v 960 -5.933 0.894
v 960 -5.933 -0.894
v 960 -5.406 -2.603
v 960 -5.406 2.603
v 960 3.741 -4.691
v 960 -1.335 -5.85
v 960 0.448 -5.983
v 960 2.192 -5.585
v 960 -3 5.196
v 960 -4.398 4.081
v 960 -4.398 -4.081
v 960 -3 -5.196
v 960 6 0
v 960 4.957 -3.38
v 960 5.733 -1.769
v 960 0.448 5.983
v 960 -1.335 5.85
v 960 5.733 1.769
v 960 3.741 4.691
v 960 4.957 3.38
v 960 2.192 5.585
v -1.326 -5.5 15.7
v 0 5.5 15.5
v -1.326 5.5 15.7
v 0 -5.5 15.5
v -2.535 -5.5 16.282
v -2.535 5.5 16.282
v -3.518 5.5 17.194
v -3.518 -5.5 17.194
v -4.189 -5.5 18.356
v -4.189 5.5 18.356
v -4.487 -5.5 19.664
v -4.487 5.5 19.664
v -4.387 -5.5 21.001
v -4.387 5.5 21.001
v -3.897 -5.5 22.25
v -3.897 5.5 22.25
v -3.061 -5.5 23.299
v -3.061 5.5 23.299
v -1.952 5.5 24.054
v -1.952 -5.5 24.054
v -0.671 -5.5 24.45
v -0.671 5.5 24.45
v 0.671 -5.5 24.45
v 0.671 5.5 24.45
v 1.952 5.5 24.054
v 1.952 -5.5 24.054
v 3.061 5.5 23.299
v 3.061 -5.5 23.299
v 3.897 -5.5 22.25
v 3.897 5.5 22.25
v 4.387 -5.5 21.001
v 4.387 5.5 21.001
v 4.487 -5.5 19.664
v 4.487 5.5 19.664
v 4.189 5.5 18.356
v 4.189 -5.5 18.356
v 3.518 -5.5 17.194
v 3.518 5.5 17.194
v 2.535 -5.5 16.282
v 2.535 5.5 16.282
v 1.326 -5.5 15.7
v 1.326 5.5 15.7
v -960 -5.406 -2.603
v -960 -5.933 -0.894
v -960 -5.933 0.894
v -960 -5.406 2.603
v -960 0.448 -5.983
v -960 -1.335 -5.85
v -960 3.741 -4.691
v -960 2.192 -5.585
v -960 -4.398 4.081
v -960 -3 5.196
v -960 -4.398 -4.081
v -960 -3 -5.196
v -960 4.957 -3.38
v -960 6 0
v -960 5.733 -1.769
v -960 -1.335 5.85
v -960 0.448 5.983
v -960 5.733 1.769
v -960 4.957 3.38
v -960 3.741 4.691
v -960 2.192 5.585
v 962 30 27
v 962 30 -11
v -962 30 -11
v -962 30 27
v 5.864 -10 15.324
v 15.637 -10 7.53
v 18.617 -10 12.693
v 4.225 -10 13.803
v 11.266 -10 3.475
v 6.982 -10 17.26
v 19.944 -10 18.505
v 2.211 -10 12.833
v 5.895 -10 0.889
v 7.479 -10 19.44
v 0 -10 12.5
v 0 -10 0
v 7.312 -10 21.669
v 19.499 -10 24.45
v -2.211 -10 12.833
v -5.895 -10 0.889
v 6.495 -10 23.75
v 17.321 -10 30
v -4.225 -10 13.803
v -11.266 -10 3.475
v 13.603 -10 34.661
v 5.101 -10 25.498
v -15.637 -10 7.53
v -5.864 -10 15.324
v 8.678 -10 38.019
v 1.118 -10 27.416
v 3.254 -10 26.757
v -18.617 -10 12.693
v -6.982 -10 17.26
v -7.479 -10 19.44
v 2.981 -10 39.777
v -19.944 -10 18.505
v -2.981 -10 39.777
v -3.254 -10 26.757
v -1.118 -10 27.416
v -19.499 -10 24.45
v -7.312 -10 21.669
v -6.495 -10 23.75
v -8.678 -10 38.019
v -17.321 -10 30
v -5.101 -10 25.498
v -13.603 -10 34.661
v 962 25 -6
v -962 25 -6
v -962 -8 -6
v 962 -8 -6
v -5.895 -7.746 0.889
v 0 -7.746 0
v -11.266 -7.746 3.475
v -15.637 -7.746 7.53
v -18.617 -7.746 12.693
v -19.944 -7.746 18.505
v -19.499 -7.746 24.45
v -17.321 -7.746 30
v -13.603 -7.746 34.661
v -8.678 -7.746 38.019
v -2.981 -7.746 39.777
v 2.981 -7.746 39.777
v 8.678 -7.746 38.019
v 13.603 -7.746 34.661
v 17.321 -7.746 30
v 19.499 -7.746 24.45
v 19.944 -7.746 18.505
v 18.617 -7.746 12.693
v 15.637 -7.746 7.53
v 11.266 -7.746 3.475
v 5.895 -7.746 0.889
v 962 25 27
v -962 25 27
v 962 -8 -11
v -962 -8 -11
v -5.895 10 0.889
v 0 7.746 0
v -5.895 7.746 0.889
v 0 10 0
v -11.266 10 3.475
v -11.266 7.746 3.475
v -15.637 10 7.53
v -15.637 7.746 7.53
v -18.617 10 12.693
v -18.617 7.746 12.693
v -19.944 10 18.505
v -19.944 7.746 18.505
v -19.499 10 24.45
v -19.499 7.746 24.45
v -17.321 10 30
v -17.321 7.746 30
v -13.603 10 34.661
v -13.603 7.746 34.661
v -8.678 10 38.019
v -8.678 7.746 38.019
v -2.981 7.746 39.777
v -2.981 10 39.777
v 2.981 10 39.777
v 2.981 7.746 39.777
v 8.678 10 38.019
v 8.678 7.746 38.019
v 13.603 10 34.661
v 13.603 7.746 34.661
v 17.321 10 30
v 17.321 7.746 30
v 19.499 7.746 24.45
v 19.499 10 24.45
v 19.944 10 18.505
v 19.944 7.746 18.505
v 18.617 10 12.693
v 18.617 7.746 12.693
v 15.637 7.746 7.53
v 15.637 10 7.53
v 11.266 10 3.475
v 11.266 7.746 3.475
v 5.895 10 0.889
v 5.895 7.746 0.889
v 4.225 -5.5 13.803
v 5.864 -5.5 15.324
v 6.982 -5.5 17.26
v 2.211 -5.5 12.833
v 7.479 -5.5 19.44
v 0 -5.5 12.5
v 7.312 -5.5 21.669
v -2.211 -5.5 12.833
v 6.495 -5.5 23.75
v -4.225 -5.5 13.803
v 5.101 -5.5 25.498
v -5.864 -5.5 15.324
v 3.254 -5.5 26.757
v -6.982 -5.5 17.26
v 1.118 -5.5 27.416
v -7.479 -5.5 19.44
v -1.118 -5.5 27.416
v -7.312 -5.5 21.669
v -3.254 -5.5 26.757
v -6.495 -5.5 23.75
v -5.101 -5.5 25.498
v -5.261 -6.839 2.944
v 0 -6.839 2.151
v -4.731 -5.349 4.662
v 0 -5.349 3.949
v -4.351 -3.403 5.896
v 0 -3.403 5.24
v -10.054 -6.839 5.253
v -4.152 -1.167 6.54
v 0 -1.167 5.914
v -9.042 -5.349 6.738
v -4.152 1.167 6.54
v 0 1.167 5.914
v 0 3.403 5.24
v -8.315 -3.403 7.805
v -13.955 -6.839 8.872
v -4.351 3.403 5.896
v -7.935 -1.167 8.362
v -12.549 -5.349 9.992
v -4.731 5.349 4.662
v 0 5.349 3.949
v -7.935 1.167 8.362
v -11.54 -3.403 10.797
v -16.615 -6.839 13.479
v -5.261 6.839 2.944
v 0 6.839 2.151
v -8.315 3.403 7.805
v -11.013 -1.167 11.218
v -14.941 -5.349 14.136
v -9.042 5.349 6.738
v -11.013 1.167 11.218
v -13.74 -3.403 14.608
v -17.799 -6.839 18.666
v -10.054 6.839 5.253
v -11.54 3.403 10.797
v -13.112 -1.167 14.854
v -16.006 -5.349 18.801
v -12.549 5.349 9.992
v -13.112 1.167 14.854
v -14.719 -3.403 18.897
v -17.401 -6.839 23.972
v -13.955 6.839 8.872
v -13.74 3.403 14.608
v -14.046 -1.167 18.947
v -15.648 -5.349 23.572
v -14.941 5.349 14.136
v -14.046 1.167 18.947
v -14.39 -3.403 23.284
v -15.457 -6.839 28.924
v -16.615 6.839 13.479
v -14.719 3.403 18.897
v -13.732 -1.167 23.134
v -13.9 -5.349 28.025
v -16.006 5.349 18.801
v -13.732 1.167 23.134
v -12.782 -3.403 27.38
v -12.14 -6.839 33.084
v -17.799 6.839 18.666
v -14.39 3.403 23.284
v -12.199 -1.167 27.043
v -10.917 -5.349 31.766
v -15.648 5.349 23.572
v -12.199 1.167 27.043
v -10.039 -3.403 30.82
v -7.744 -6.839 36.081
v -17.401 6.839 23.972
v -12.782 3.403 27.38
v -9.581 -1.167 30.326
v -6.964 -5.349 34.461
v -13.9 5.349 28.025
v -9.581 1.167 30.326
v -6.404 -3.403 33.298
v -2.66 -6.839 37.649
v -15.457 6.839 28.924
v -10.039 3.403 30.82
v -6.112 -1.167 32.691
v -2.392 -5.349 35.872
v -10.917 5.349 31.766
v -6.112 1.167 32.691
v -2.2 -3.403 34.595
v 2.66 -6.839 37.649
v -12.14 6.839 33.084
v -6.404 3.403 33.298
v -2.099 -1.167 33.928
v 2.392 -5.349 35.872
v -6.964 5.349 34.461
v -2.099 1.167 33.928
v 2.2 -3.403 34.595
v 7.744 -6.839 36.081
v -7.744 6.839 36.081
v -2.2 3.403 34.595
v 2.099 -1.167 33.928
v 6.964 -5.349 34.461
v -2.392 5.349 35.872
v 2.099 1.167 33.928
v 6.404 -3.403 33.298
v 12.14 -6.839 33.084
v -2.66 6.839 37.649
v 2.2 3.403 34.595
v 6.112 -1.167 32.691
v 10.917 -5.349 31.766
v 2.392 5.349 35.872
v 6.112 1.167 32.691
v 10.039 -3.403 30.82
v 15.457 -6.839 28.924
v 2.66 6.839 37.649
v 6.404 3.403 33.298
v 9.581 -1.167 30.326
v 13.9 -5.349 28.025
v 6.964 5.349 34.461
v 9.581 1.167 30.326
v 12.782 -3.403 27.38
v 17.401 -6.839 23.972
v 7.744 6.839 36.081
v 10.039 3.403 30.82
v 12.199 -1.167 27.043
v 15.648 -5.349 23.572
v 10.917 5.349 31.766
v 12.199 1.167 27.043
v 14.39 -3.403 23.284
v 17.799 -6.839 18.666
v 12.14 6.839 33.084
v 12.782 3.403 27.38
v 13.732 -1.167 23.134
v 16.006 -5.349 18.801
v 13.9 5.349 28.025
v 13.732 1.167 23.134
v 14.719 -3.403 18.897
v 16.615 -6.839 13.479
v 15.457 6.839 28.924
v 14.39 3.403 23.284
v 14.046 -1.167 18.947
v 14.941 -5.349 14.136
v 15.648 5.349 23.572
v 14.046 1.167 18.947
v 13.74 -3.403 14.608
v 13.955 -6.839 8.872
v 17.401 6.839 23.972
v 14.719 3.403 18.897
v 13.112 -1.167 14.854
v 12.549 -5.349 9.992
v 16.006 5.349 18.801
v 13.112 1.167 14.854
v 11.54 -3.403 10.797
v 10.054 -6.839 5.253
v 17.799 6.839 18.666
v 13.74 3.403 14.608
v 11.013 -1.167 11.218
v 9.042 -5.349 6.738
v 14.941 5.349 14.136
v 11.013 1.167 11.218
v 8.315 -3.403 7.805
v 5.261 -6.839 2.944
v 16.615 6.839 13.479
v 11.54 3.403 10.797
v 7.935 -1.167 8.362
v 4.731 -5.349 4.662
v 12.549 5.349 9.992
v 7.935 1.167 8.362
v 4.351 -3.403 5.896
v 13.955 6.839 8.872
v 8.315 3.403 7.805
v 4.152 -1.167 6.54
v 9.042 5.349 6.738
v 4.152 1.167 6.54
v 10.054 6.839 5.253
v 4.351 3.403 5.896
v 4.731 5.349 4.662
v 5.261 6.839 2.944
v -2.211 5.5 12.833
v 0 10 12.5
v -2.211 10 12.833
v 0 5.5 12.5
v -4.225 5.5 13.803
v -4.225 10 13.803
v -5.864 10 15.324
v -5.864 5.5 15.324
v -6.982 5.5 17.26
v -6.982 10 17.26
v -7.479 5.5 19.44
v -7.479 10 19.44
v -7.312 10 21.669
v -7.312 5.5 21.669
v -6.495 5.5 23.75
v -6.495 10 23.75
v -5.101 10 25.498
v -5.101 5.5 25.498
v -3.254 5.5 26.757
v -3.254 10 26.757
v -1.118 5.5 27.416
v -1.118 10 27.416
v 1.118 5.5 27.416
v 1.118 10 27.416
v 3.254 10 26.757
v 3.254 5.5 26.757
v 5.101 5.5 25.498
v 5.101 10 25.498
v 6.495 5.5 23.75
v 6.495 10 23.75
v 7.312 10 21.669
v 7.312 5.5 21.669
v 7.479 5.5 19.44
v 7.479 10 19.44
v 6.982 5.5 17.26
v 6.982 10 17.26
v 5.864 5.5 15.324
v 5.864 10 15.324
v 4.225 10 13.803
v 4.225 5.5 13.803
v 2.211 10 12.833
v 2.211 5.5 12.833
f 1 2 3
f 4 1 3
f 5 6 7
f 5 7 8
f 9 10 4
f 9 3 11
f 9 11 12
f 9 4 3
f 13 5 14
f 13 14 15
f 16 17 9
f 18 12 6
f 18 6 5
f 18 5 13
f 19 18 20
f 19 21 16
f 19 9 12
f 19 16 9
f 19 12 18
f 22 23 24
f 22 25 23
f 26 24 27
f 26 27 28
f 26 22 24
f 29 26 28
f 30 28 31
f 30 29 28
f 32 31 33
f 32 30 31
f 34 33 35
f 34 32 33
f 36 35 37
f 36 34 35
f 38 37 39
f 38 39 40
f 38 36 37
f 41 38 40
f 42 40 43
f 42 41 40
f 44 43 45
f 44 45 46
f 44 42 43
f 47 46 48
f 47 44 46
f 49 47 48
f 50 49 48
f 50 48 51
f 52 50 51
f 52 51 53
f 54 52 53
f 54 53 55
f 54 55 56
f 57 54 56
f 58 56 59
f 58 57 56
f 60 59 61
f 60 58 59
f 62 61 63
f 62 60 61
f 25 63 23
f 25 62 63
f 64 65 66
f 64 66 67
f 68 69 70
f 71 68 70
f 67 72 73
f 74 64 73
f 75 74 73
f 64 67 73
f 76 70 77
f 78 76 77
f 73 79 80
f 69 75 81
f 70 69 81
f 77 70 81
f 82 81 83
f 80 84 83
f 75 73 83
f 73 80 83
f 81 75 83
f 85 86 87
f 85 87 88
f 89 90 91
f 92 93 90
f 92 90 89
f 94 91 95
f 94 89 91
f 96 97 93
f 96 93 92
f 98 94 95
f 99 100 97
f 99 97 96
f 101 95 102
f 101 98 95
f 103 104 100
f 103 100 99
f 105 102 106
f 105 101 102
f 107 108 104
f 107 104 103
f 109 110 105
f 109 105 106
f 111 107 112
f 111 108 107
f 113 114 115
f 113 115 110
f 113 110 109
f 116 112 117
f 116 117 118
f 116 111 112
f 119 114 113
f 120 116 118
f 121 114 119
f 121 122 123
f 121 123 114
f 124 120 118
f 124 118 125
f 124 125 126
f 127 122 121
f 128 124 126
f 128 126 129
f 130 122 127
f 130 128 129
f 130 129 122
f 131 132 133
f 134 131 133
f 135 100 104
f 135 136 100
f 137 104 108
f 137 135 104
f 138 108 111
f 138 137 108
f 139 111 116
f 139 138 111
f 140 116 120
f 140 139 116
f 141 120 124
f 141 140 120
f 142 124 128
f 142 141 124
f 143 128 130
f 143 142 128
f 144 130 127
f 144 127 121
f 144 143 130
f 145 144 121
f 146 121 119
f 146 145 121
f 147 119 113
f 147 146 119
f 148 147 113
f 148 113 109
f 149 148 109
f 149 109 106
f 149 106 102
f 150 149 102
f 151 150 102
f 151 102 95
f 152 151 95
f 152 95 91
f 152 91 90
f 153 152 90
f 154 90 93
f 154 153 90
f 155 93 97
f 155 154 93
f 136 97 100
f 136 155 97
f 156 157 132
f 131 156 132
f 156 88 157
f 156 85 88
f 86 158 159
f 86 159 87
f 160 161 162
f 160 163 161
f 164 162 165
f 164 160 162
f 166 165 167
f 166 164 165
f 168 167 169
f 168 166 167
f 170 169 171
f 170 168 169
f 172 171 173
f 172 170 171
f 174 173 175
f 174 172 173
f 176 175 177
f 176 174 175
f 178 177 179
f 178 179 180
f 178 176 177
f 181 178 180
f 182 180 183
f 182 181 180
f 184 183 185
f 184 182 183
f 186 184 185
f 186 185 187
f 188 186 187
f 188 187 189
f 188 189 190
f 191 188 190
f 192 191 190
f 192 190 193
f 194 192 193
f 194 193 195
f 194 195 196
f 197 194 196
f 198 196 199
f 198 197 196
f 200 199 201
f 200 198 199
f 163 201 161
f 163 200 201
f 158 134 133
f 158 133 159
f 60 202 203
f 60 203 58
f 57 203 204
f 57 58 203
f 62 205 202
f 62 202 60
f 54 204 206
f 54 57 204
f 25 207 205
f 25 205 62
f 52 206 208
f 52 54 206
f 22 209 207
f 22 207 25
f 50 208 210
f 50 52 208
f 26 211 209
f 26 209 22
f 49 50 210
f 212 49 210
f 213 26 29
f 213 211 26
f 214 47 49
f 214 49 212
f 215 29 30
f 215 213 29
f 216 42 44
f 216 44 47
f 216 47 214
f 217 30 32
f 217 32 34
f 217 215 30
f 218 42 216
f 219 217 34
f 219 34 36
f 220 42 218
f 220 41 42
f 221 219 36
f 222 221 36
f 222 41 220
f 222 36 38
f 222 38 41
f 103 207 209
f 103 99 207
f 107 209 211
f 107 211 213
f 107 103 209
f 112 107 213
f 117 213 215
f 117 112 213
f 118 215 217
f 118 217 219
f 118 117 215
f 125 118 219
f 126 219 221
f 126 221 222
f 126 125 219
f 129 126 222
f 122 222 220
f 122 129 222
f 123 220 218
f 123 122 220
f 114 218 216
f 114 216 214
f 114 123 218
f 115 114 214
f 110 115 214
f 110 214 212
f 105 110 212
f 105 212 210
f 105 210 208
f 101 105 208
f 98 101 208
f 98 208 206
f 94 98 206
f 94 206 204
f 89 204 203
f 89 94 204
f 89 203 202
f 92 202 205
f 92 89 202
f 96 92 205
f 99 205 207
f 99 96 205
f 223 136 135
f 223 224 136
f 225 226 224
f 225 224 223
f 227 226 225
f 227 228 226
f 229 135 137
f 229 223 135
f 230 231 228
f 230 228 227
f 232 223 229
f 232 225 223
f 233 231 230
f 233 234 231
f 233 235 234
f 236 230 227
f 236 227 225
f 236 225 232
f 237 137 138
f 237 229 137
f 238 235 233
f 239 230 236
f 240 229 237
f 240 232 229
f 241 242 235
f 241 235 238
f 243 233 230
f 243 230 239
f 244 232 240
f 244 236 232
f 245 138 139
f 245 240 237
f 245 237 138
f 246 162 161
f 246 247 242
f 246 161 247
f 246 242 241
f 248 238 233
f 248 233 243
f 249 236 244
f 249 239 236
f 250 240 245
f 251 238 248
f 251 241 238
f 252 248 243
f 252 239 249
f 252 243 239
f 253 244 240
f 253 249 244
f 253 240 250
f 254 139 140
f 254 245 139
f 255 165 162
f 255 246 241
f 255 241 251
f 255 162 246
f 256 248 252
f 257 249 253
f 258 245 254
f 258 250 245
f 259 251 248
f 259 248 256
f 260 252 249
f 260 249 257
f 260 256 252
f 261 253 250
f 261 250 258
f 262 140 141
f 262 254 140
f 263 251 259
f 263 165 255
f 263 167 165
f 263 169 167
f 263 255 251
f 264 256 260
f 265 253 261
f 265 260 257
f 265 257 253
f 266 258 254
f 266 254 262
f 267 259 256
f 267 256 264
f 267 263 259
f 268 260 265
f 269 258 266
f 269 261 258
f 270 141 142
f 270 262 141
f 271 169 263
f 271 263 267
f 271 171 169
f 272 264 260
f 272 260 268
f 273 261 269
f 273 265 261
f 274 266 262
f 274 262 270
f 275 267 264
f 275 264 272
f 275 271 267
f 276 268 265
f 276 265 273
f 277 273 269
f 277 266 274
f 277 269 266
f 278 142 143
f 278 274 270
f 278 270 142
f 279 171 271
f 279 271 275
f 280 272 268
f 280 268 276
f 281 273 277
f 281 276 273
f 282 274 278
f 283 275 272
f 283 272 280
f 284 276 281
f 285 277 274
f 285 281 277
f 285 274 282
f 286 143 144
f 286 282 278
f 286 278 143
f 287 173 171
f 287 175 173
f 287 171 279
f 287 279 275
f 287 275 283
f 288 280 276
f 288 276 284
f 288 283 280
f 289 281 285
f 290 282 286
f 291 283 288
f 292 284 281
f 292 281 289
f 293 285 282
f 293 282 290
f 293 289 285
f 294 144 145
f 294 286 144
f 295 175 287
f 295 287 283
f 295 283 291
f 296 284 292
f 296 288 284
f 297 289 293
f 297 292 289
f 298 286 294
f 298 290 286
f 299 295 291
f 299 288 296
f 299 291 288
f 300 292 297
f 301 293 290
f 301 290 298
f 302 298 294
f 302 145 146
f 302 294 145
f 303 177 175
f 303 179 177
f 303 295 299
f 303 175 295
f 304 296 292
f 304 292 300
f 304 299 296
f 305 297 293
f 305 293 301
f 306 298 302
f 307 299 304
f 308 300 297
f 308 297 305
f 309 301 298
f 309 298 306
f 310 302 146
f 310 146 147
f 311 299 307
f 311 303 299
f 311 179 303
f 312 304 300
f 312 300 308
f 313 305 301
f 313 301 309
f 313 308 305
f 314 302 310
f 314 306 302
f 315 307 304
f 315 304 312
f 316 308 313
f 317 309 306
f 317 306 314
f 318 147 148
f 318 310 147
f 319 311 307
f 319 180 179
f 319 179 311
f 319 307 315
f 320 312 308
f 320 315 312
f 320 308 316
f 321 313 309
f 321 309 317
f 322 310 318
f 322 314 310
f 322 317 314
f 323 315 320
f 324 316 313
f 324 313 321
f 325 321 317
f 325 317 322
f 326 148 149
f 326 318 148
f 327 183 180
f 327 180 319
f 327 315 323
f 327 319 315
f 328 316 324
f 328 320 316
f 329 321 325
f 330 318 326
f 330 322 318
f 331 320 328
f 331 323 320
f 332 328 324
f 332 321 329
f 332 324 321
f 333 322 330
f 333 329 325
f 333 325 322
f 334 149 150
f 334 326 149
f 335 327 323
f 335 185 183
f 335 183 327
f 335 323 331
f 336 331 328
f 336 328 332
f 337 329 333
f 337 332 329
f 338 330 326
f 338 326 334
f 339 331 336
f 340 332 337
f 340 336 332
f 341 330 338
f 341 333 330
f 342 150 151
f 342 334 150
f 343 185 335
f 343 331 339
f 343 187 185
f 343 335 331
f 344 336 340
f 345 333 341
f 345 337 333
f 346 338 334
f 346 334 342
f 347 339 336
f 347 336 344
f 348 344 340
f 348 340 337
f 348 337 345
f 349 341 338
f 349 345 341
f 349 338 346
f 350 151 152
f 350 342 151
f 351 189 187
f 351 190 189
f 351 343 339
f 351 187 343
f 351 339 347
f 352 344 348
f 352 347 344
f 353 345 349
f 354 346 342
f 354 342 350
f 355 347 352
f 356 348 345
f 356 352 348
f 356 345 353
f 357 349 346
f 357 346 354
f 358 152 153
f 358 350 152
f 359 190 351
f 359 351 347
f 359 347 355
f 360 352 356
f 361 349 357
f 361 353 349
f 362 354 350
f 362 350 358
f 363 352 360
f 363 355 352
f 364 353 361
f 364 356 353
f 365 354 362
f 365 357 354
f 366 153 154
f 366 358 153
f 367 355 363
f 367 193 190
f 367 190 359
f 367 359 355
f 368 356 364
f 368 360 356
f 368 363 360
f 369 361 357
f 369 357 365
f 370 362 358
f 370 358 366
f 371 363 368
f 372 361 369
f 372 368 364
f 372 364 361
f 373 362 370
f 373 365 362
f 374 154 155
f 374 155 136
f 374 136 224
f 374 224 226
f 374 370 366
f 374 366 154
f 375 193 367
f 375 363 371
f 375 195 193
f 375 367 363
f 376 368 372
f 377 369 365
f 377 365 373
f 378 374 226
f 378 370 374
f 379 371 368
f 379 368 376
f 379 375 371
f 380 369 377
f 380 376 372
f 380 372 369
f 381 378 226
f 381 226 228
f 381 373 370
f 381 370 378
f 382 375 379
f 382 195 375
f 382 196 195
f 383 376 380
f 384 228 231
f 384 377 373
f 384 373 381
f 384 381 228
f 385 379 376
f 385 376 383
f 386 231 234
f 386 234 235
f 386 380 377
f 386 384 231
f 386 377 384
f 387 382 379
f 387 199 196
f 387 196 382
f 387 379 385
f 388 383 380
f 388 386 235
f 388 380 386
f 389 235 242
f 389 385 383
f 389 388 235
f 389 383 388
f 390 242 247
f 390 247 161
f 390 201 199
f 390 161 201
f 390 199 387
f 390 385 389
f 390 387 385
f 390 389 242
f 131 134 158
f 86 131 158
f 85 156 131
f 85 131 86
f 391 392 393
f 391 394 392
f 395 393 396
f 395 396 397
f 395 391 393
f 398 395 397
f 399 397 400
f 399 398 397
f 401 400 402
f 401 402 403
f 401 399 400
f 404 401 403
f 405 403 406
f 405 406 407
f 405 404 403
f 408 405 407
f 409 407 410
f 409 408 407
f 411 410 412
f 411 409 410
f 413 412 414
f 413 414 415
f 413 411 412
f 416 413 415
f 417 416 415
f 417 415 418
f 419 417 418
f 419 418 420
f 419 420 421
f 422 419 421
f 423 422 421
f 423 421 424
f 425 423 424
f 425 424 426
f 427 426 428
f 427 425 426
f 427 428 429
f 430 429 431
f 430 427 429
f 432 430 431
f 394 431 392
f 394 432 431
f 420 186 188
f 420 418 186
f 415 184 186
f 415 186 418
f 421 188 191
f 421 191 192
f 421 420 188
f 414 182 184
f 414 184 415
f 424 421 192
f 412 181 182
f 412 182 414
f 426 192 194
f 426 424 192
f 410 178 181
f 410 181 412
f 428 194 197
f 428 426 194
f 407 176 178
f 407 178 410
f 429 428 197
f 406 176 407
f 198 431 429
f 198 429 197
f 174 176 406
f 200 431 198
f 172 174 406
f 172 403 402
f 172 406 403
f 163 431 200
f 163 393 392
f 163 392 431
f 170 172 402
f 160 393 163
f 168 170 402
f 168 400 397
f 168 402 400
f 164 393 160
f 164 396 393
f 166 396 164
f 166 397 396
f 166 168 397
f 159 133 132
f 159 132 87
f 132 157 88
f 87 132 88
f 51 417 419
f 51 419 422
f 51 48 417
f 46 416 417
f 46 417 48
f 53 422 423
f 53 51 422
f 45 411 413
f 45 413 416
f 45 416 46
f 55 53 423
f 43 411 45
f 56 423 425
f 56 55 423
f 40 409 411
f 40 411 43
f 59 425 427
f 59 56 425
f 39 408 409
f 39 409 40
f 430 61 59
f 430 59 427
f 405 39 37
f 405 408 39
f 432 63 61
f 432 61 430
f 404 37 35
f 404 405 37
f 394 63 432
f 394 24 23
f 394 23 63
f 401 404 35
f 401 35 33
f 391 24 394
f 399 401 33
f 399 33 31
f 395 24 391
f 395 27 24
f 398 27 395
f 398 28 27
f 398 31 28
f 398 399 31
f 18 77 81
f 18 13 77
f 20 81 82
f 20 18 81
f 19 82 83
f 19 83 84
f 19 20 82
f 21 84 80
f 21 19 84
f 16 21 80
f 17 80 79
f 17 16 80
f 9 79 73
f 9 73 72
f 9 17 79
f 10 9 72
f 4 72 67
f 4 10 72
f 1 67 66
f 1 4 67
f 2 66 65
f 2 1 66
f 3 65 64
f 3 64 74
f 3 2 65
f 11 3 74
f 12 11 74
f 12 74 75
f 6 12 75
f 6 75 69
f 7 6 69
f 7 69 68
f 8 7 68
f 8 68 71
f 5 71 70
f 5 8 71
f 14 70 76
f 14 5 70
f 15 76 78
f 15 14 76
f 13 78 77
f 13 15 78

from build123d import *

# Parameters (mm, degrees)
F0_R     = 6
F1_DEPTH = 960
F6_DEPTH = 962


with BuildPart() as f1:
    # F0 (on Right) → F1 (new body, symmetric)
    with BuildSketch(Plane.YZ):
        Circle(F0_R)
    extrude(amount=F1_DEPTH, both=True)


with BuildPart() as f4:
    # F2 (on Right) → F4 (revolve)
    with BuildSketch(Plane.YZ):
        with BuildLine():
            Line((5.5, 15.5), (-5.5, 15.5))
            Line((-5.5, 15.5), (-5.5, 12.5))
            Line((-5.5, 12.5), (-10, 12.5))
            Line((-10, 12.5), (-10, 0))
            Line((-10, 0), (-7.745967, 0))
            ThreePointArc((-7.745967, 0), (0, 6), (7.745967, 0))
            Line((7.745967, 0), (10, 0))
            Line((10, 0), (10, 12.5))
            Line((10, 12.5), (5.5, 12.5))
            Line((5.5, 12.5), (5.5, 15.5))
        make_face()
    revolve(axis=Axis((0, -0.010755, 20), (0, 1, 0)))


with BuildPart() as f6:
    # F5 (on Right) → F6 (new body, symmetric)
    with BuildSketch(Plane.YZ):
        Polygon((25, -6), (-8, -6), (-8, -11), (30, -11), (30, 27), (25, 27), align=None)
    extrude(amount=F6_DEPTH, both=True)


solid = Compound([f1.part, f4.part, f6.part])
